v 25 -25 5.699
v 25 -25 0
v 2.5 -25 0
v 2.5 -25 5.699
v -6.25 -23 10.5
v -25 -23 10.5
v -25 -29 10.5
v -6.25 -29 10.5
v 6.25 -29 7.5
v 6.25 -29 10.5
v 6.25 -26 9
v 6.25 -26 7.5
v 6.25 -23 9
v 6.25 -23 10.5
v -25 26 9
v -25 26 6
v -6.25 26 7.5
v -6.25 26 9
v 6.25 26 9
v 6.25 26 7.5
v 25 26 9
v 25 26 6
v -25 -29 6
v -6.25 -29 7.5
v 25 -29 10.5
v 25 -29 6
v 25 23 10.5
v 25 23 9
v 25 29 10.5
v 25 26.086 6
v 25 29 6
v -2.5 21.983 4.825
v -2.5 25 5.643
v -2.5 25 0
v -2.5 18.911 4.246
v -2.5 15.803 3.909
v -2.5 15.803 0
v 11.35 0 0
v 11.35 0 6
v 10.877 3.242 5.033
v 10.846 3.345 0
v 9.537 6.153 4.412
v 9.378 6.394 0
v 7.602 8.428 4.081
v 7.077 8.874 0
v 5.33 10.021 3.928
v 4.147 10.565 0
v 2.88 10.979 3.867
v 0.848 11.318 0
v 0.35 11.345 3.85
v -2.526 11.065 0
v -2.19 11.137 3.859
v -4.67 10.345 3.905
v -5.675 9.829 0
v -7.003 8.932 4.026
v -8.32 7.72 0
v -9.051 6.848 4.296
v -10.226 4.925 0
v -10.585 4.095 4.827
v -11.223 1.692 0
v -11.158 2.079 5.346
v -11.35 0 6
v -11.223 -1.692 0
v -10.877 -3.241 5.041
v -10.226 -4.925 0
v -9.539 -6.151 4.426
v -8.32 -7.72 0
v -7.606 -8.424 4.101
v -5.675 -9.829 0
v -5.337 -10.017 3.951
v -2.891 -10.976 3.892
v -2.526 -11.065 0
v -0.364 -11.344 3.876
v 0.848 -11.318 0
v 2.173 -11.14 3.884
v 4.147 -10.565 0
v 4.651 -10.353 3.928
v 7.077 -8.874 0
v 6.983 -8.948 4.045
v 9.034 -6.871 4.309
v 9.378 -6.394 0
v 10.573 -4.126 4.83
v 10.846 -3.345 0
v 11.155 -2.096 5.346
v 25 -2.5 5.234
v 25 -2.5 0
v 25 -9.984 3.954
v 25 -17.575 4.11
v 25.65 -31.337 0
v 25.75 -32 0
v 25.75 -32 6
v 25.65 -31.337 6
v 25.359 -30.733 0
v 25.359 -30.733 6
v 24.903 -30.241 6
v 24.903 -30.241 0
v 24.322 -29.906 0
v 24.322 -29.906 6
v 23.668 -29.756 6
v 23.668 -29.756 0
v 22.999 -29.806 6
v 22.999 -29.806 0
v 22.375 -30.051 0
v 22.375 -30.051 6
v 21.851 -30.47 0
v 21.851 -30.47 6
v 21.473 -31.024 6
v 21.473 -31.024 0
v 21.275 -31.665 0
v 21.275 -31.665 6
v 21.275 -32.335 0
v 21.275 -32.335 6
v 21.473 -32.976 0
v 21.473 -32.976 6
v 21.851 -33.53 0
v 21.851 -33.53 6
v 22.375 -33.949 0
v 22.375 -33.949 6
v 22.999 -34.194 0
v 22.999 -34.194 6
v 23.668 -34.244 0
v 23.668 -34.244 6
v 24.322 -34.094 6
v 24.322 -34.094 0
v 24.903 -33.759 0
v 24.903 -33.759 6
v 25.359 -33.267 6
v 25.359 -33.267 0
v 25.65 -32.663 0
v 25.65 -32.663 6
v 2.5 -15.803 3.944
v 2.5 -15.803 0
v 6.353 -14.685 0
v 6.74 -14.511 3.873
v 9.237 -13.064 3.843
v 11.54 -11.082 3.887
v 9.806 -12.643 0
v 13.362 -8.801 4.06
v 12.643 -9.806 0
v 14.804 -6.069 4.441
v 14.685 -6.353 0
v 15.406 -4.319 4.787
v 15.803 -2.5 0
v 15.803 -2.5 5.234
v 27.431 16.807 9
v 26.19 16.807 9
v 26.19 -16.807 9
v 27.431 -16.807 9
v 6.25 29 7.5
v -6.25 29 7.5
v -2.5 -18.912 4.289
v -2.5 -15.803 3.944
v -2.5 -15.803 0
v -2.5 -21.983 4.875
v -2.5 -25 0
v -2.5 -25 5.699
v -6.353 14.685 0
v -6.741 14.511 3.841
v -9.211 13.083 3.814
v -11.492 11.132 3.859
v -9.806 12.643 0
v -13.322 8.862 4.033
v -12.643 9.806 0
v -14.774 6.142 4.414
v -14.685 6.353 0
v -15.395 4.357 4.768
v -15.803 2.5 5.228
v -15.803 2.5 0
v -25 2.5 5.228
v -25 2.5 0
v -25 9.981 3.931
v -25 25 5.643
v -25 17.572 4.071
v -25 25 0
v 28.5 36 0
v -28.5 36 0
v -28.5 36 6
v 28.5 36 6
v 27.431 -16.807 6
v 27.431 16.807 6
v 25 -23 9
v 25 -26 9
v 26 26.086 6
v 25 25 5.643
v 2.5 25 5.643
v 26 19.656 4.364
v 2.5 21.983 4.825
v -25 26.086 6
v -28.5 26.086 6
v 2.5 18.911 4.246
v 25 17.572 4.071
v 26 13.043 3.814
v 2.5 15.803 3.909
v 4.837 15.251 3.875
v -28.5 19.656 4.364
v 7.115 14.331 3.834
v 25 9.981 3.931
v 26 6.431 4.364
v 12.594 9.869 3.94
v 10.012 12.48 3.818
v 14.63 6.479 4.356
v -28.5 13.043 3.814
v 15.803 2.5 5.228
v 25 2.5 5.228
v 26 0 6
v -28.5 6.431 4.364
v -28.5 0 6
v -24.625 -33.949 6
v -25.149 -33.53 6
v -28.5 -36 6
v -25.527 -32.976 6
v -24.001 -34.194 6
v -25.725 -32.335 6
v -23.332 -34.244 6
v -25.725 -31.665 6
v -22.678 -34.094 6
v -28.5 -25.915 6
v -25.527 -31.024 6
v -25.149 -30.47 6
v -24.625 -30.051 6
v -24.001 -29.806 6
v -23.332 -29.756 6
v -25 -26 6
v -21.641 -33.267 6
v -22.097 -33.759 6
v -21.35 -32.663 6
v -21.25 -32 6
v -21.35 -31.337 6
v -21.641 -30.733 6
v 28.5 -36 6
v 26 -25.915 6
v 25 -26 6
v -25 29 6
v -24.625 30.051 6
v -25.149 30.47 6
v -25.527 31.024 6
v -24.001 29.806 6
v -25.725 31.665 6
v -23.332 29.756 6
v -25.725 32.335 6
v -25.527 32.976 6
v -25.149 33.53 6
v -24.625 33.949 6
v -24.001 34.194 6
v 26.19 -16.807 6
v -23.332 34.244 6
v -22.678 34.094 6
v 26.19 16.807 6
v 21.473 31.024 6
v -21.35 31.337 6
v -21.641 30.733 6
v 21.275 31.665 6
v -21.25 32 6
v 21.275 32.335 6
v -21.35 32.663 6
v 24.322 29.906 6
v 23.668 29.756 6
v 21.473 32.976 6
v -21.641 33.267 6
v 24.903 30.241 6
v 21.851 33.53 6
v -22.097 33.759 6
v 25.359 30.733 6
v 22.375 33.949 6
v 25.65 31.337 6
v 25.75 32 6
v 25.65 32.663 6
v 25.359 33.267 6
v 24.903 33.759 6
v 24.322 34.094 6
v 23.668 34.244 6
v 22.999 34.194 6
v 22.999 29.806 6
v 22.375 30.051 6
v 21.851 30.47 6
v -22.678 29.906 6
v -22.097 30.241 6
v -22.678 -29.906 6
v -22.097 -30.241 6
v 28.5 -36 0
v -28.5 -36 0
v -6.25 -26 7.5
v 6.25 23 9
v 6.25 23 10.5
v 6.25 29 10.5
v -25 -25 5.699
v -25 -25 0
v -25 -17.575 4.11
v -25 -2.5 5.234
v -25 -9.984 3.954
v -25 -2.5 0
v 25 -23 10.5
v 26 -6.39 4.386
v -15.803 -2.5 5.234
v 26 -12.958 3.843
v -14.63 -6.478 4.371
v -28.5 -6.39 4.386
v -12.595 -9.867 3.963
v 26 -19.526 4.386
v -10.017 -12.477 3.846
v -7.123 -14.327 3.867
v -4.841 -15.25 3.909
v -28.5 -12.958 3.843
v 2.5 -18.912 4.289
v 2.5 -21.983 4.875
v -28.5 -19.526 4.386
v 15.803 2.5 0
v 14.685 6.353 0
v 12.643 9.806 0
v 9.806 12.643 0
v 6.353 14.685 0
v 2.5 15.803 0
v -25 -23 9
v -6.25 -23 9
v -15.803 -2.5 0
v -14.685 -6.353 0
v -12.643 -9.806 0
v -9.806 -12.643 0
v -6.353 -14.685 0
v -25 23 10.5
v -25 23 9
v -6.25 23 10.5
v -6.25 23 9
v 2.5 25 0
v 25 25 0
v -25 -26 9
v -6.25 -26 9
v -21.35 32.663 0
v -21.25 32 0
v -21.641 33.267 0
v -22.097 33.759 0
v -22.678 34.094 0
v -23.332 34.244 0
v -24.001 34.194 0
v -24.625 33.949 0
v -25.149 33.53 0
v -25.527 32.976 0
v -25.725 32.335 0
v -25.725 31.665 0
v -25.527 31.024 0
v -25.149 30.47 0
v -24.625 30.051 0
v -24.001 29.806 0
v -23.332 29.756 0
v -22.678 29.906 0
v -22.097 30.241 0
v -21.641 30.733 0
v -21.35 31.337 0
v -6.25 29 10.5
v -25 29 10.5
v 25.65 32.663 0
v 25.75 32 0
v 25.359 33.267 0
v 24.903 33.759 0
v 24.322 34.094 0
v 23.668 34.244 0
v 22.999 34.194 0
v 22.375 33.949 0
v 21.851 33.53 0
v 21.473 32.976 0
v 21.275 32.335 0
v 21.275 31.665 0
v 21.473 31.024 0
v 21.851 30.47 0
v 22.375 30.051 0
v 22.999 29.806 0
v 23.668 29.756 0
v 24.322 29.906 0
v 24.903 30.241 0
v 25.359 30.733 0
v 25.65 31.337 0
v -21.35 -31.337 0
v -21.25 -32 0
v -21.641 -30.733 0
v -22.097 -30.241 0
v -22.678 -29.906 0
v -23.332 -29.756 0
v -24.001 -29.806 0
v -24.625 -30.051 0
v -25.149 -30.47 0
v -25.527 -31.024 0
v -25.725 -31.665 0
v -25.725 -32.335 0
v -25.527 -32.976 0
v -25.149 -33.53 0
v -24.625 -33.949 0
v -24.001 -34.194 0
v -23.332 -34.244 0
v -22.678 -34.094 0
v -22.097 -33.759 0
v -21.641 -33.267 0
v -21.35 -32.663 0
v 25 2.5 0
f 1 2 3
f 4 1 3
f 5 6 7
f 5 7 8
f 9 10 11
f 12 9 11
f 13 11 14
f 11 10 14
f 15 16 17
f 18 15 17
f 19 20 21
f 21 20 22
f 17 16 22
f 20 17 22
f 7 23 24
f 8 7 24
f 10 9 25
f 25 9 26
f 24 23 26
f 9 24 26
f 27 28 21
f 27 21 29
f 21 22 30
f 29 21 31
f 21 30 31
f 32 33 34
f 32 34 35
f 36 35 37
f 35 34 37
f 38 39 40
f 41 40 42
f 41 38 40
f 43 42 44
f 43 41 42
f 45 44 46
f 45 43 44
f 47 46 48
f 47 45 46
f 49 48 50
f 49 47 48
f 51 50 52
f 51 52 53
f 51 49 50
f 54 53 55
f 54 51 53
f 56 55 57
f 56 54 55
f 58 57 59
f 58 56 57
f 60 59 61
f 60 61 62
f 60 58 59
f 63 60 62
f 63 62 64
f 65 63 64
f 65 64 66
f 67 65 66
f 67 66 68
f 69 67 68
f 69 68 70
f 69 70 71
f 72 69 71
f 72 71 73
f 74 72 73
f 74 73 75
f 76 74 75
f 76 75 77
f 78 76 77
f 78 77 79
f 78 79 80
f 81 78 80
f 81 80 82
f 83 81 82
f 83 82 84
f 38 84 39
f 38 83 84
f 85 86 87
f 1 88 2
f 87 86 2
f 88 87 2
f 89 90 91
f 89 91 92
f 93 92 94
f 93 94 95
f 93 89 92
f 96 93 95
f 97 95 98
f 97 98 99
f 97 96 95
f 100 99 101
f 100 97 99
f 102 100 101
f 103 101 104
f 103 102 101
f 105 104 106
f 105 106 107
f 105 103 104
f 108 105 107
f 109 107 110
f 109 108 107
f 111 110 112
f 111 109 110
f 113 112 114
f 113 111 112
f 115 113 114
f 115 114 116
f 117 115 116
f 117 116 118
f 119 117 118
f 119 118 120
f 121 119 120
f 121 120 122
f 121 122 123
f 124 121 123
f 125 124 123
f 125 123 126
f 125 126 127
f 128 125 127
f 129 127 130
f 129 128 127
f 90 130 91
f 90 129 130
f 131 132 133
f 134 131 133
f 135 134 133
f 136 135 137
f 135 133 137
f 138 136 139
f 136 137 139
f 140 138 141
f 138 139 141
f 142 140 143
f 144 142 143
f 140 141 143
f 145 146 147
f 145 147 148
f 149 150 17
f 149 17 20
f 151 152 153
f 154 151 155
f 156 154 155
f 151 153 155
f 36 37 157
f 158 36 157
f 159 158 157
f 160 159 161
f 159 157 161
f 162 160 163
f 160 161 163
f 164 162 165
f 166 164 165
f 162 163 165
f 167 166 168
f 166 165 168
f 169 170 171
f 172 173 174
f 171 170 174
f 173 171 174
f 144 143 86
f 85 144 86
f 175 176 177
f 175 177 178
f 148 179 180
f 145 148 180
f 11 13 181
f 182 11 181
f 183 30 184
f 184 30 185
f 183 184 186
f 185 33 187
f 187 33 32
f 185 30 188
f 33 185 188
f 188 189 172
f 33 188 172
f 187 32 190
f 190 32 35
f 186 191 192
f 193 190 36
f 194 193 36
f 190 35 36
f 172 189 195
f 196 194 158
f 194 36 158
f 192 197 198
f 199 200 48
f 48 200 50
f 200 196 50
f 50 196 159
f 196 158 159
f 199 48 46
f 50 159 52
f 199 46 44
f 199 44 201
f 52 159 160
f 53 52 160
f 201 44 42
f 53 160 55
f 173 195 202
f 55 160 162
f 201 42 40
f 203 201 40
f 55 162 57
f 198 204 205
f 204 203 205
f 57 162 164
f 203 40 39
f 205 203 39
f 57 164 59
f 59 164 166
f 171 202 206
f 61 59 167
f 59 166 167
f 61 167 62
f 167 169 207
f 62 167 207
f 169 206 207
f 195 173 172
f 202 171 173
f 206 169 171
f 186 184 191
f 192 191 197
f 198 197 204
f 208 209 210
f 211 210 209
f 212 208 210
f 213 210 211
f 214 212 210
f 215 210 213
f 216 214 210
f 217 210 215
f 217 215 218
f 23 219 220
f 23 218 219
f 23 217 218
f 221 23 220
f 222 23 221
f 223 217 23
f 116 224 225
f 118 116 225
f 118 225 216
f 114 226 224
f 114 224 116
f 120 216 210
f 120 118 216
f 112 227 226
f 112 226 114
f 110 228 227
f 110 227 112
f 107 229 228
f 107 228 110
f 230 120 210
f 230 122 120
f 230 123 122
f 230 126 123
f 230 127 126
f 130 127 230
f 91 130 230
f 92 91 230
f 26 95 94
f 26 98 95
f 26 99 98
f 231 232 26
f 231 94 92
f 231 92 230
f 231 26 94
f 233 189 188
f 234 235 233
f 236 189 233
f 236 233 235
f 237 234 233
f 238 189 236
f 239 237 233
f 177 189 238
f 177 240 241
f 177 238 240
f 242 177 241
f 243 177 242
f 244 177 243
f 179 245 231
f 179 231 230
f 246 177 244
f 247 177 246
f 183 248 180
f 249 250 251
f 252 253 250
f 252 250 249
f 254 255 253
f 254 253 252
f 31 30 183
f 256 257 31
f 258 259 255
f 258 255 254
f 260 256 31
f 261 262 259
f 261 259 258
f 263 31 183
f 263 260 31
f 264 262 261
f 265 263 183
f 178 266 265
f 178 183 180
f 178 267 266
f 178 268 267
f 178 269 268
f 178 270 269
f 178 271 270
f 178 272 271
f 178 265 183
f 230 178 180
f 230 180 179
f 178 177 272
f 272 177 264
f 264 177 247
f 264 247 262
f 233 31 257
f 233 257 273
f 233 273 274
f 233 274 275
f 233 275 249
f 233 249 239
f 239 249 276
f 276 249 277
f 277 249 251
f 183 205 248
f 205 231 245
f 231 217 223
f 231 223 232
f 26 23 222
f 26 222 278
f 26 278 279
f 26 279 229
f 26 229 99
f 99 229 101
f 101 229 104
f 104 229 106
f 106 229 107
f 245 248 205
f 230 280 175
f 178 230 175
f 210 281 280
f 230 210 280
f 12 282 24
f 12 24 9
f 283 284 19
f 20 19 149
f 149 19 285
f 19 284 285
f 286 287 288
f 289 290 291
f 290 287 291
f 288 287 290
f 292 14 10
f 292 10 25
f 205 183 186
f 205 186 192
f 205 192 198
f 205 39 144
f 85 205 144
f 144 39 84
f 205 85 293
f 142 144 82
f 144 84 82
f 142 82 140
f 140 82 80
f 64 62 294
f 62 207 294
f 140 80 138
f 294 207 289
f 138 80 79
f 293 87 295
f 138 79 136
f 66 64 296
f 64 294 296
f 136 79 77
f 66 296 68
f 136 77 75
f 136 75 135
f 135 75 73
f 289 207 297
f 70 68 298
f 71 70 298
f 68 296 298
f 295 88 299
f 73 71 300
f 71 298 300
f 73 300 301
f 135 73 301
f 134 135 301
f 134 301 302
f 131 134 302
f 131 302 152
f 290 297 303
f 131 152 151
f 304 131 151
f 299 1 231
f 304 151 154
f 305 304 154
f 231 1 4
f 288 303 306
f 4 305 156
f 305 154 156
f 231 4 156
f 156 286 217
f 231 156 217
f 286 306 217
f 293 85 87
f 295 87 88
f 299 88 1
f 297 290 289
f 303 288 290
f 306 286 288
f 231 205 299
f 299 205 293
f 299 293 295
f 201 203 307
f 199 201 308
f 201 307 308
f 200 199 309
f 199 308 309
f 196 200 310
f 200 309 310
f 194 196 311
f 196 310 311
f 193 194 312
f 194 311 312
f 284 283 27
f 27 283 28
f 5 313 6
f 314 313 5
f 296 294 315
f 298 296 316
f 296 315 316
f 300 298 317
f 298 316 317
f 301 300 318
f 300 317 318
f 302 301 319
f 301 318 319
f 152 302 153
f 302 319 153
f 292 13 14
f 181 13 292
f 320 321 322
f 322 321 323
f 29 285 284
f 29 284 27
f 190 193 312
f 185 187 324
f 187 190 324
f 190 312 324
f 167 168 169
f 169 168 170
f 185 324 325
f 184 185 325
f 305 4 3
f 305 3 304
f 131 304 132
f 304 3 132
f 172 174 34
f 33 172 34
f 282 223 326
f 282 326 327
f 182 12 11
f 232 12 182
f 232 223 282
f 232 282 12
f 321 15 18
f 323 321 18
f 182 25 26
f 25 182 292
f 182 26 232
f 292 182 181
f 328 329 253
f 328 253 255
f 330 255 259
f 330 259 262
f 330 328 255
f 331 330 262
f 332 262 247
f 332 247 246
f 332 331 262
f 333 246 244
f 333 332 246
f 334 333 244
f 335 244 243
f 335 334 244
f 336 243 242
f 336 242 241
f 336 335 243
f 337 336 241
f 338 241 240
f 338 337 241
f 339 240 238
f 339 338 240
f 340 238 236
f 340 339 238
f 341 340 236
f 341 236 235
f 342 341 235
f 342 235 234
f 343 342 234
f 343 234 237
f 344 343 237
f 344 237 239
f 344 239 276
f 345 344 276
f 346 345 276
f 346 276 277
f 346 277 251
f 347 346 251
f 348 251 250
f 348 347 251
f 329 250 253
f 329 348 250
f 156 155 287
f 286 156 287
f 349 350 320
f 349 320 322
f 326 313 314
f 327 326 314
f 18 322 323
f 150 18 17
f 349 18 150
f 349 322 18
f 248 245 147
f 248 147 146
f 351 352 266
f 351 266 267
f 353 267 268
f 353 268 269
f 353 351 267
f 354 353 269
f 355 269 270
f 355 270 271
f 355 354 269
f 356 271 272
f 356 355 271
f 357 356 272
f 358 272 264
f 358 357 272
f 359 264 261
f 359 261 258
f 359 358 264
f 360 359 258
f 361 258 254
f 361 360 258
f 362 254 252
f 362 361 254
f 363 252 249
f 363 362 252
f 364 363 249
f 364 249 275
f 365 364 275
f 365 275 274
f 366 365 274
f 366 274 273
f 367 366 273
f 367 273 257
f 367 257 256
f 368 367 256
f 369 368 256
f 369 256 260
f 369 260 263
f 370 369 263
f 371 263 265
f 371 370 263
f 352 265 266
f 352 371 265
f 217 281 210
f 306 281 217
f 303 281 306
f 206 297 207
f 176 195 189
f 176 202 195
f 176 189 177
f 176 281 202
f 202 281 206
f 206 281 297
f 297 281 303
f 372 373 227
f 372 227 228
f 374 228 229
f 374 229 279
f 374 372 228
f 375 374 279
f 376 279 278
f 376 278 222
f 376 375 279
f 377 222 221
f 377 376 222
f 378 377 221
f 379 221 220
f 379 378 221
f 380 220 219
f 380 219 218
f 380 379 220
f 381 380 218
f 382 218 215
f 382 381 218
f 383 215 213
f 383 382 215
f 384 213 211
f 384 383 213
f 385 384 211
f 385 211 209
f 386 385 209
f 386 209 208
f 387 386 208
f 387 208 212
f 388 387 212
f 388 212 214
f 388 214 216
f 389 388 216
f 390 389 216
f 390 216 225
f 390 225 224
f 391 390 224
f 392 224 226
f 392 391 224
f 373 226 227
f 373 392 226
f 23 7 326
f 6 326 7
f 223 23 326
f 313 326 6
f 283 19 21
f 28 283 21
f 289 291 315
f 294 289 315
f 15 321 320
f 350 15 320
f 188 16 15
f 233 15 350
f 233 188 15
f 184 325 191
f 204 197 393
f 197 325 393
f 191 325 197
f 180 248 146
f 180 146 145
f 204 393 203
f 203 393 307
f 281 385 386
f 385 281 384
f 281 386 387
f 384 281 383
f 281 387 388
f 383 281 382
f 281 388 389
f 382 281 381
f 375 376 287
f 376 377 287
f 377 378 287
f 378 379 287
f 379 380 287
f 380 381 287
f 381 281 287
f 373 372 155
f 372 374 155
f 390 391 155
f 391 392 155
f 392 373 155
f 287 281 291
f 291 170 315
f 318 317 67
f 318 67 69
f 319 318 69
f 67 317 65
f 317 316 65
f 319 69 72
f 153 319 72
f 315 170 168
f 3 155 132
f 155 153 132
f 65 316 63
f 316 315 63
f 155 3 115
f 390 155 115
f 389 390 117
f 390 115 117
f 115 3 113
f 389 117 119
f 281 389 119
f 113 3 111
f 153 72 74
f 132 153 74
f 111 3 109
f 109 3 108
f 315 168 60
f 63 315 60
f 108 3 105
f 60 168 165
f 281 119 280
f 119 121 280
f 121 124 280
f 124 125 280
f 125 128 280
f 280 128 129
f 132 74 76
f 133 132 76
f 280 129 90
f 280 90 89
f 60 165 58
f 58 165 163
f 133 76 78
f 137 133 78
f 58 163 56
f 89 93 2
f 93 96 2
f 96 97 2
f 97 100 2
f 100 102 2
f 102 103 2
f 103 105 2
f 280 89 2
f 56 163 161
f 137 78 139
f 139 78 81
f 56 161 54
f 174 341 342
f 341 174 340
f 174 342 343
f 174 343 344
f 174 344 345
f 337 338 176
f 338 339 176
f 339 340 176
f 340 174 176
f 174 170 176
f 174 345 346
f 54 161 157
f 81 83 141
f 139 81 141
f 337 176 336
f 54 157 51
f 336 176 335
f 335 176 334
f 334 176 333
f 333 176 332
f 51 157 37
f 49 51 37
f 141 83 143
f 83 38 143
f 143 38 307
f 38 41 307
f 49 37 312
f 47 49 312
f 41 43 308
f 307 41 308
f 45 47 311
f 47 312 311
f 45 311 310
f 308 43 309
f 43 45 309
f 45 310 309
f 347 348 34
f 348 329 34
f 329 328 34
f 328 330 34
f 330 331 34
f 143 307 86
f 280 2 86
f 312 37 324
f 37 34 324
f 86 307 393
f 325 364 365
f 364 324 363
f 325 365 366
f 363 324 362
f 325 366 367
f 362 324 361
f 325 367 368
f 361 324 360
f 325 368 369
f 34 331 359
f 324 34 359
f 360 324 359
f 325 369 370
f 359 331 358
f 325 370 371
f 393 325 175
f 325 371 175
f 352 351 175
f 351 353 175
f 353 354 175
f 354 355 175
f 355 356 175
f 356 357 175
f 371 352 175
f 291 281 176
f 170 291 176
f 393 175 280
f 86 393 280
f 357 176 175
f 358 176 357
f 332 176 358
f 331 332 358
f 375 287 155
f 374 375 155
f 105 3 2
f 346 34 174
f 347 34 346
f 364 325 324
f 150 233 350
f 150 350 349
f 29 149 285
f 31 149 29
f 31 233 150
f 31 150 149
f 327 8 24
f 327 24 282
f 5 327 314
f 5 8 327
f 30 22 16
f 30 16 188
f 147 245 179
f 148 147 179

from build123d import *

# Parameters (mm, degrees)
F0_W      = 57
F0_H      = 72
F0_R      = 2.25
F0_R_2    = 11.35
F1_DEPTH  = 6
F2_W      = 50
F2_H      = 3
F3_DEPTH  = 3
F4_W      = 50
F4_H      = 6
F5_DEPTH  = 1.5
F6_W      = 50
F6_H      = 6
F7_DEPTH  = 1.5
F8_W      = 12.50048
F8_H      = 66.124424
F9_DEPTH  = 3
F10_W     = 1.240771
F10_H     = 33.613906
F11_DEPTH = 3
F13_DEPTH = 54.5


with BuildPart() as f1:
    # F0 (on Top) → F1 (new body)
    with BuildSketch(Plane.XY):
        Rectangle(F0_W, F0_H)
        with Locations((-23.5, -32)):
            Circle(F0_R, mode=Mode.SUBTRACT)
        with BuildLine():
            Line((-25, -2.5), (-15.803481, -2.5))
            ThreePointArc((-15.803481, -2.5), (-11.313708, -11.313708), (-2.5, -15.803481))
            Line((-2.5, -15.803481), (-2.5, -25))
            Line((-2.5, -25), (-25, -25))
            Line((-25, -25), (-25, -2.5))
        make_face(mode=Mode.SUBTRACT)
        with Locations((23.5, -32)):
            Circle(F0_R, mode=Mode.SUBTRACT)
        with BuildLine():
            Line((15.803481, -2.5), (25, -2.5))
            Line((25, -2.5), (25, -25))
            Line((25, -25), (2.5, -25))
            Line((2.5, -25), (2.5, -15.803481))
            ThreePointArc((2.5, -15.803481), (11.313708, -11.313708), (15.803481, -2.5))
        make_face(mode=Mode.SUBTRACT)
        with BuildLine():
            Line((-2.5, 25), (-2.5, 15.803481))
            ThreePointArc((-2.5, 15.803481), (-11.313708, 11.313708), (-15.803481, 2.5))
            Line((-15.803481, 2.5), (-25, 2.5))
            Line((-25, 2.5), (-25, 25))
            Line((-25, 25), (-2.5, 25))
        make_face(mode=Mode.SUBTRACT)
        with Locations((-23.5, 32)):
            Circle(F0_R, mode=Mode.SUBTRACT)
        Circle(F0_R_2, mode=Mode.SUBTRACT)
        with BuildLine():
            Line((2.5, 25), (25, 25))
            Line((25, 25), (25, 2.5))
            Line((25, 2.5), (15.803481, 2.5))
            ThreePointArc((15.803481, 2.5), (11.313708, 11.313708), (2.5, 15.803481))
            Line((2.5, 15.803481), (2.5, 25))
        make_face(mode=Mode.SUBTRACT)
        with Locations((23.5, 32)):
            Circle(F0_R, mode=Mode.SUBTRACT)
    extrude(amount=F1_DEPTH)

    # F2 (on face) → F3 (join)
    with BuildSketch(Plane.XY.offset(6)):
        with Locations((0, -27.5)):
            Rectangle(F2_W, F2_H)
        with Locations((0, 27.5)):
            Rectangle(F2_W, F2_H)
    extrude(amount=F3_DEPTH)

    # F4 (on face) → F5 (join)
    with BuildSketch(Plane.XY.offset(9)):
        with Locations((0, -26)):
            Rectangle(F4_W, F4_H)
    extrude(amount=F5_DEPTH)

    # F6 (on face) → F7 (join)
    with BuildSketch(Plane.XY.offset(9)):
        with Locations((0, 26)):
            Rectangle(F6_W, F6_H)
    extrude(amount=F7_DEPTH)

    # F8 (on face) → F9 (cut)
    with BuildSketch(Plane.XY.offset(10.5)):
        Rectangle(F8_W, F8_H)
    extrude(amount=-F9_DEPTH, mode=Mode.SUBTRACT)

    # F10 (on face) → F11 (join)
    with BuildSketch(Plane.XY.offset(6)):
        with Locations((26.810841, 0)):
            Rectangle(F10_W, F10_H)
    extrude(amount=F11_DEPTH)

    # F12 (on face) → F13 (cut)
    with BuildSketch(Plane(origin=(-28.5, 0, 0), x_dir=(0, -1, 0), z_dir=(-1, 0, 0))):
        with BuildLine():
            Line((0, 6), (-26.086396, 6))
            ThreePointArc((-26.086396, 6), (-13.043198, 3.813688), (0, 6))
        make_face()
        with BuildLine():
            Line((25.915496, 6), (0, 6))
            ThreePointArc((0, 6), (12.957748, 3.843054), (25.915496, 6))
        make_face()
    extrude(amount=-F13_DEPTH, mode=Mode.SUBTRACT)


solid = f1.part
